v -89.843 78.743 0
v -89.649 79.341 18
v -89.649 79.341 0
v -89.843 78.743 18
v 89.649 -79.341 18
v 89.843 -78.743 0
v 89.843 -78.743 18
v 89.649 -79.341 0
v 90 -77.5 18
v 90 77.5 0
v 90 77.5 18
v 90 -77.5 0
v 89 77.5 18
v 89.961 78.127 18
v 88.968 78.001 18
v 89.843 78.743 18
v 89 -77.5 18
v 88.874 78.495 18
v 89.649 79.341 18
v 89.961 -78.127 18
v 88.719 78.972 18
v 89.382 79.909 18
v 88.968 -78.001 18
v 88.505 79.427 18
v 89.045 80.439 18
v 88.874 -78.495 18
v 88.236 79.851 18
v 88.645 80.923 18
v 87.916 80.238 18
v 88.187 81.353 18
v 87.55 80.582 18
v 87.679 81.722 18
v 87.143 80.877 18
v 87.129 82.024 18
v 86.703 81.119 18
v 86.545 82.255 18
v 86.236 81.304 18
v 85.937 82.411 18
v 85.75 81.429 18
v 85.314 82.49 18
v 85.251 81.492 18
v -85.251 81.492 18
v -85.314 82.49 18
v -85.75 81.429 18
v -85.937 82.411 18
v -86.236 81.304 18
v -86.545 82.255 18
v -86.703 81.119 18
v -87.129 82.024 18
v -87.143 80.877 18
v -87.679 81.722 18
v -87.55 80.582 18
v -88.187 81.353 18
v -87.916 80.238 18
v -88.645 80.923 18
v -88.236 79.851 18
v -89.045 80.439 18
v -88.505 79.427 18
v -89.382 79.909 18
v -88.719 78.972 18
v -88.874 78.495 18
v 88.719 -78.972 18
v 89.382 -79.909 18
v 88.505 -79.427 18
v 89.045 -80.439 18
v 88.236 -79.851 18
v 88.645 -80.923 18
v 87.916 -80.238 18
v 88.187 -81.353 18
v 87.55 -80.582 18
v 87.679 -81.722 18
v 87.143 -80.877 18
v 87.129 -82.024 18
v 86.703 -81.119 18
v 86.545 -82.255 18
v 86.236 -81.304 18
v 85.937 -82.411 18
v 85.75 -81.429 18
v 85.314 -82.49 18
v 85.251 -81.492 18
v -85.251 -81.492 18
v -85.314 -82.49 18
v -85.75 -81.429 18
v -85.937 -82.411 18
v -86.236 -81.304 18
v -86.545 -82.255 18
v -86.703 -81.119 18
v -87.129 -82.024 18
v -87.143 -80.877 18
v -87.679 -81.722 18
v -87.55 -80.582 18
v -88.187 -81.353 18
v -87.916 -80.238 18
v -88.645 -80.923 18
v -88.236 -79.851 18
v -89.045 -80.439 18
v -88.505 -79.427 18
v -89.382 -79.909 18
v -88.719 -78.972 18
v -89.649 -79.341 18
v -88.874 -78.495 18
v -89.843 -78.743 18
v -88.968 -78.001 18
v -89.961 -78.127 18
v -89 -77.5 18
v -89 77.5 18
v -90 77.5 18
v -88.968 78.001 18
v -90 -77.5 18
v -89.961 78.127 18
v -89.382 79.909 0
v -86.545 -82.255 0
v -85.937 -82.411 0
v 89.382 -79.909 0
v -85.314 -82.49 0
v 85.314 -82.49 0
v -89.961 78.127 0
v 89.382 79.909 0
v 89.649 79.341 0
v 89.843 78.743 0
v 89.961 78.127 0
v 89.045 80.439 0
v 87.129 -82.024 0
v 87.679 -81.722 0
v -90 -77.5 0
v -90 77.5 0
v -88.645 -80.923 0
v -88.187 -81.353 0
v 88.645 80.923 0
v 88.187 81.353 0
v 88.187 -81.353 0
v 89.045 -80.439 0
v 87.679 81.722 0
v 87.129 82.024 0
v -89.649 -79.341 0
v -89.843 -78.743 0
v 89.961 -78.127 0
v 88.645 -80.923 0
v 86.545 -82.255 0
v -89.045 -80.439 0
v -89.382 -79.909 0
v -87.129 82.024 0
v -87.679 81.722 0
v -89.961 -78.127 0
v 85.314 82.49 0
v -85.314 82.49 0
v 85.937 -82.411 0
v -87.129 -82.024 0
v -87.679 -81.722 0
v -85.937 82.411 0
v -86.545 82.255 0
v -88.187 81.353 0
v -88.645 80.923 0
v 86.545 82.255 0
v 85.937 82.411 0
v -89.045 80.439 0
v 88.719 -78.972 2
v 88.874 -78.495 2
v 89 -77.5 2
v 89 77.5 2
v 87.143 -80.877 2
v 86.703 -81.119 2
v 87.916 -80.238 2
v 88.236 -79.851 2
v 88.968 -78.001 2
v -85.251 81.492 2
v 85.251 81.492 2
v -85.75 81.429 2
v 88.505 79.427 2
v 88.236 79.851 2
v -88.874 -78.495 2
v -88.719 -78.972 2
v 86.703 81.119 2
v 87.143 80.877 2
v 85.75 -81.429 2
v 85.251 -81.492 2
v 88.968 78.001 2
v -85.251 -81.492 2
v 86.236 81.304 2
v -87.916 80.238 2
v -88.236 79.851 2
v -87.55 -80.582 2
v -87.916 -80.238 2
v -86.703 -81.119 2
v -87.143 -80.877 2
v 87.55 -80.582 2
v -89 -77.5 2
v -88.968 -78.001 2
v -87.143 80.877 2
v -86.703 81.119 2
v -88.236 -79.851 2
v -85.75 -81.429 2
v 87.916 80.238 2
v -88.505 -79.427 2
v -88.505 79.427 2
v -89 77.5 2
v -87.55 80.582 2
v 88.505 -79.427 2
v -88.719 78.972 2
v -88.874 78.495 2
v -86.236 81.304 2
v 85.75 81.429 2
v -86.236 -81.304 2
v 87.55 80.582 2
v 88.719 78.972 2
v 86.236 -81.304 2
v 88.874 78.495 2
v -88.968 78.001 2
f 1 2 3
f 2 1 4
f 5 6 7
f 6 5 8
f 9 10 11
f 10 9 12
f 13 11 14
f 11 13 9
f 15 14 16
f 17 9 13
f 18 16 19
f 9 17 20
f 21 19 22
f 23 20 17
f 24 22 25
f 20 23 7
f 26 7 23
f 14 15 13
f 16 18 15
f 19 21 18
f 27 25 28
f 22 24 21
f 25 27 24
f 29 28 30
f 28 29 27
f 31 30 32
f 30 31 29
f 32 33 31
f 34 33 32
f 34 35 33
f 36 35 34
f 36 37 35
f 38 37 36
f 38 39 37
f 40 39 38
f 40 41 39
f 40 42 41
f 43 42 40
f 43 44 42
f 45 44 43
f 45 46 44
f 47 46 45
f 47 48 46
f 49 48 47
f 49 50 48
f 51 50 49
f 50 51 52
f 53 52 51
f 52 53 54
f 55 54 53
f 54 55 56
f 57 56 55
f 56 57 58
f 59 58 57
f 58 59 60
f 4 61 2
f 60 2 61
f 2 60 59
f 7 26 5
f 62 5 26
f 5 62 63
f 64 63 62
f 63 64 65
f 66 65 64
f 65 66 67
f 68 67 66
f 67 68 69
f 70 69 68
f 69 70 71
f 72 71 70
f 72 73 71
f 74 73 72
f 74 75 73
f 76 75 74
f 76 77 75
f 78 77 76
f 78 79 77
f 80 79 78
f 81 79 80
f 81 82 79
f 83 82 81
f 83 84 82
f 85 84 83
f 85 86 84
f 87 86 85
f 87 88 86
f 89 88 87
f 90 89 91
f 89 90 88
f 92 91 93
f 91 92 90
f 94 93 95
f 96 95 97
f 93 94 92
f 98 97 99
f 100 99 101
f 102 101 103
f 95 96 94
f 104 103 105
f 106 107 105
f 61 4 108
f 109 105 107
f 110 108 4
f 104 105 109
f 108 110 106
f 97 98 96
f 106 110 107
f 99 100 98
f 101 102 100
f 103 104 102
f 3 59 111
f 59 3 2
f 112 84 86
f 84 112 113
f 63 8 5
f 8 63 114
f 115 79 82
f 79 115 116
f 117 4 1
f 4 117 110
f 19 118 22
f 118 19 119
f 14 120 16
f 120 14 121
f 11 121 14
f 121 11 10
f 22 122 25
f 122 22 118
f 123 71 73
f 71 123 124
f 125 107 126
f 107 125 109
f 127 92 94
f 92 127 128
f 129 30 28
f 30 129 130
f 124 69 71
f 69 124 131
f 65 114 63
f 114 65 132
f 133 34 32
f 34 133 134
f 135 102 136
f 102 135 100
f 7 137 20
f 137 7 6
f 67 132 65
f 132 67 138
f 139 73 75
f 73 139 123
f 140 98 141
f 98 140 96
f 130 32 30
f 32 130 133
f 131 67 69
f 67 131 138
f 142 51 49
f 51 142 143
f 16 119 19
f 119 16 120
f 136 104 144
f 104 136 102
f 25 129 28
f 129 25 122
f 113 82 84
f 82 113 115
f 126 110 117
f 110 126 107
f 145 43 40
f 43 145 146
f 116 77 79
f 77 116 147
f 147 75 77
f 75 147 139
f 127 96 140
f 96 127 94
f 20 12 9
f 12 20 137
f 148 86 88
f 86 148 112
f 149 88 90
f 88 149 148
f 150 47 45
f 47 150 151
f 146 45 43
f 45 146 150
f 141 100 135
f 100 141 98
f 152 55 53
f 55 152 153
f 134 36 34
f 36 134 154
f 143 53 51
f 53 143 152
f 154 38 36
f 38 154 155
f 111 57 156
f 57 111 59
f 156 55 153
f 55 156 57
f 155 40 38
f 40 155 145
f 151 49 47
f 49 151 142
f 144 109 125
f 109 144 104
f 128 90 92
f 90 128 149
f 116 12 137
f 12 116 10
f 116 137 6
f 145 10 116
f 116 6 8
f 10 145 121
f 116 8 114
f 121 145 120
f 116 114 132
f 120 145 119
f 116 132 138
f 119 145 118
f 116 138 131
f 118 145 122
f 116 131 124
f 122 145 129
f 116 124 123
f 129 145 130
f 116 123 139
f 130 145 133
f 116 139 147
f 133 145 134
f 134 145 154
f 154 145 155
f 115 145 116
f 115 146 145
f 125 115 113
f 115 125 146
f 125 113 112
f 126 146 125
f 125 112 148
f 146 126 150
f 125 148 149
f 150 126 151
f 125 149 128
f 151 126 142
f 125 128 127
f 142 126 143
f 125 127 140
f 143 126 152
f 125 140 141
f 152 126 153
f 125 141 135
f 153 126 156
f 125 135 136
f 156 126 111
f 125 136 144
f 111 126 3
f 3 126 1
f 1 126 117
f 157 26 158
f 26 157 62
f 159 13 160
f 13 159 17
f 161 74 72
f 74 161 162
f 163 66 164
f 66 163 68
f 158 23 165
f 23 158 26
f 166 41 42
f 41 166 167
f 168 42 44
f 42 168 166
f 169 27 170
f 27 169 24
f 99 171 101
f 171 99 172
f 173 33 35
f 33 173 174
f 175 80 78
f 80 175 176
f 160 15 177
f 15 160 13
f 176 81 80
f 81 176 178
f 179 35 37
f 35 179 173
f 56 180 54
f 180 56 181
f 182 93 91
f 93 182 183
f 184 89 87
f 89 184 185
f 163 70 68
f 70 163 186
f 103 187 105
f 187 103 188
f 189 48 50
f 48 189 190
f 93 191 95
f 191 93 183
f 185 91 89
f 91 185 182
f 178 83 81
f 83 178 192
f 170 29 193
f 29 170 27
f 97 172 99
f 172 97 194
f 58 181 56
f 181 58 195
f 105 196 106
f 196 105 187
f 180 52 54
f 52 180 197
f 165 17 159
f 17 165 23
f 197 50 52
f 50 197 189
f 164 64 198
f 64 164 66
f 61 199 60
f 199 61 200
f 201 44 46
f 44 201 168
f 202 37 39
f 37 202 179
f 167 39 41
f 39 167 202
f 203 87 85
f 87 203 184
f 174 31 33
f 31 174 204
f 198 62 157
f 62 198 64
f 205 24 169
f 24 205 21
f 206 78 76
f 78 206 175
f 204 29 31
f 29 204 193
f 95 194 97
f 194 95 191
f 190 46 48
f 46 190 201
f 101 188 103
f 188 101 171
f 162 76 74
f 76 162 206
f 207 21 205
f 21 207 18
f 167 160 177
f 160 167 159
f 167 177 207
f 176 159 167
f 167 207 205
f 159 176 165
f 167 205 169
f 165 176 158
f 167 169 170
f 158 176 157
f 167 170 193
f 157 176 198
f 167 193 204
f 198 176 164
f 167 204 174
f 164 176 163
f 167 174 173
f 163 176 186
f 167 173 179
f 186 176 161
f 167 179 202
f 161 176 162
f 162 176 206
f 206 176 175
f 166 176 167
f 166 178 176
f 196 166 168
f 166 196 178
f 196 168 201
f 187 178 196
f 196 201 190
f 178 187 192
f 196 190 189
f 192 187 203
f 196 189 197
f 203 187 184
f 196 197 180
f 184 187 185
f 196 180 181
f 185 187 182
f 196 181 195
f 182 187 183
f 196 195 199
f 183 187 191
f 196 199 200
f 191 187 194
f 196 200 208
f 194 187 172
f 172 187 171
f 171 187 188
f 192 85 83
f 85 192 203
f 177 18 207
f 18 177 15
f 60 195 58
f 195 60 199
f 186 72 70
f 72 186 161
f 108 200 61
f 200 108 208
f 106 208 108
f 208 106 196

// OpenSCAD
$fn = 50;


difference() {
	union() {
		hull() {
			translate(v = [-85.0000000000, 77.5000000000, 0]) {
				cylinder(h = 18, r = 5);
			}
			translate(v = [85.0000000000, 77.5000000000, 0]) {
				cylinder(h = 18, r = 5);
			}
			translate(v = [-85.0000000000, -77.5000000000, 0]) {
				cylinder(h = 18, r = 5);
			}
			translate(v = [85.0000000000, -77.5000000000, 0]) {
				cylinder(h = 18, r = 5);
			}
		}
	}
	union() {
		translate(v = [0, 0, 2]) {
			hull() {
				translate(v = [-85.0000000000, 77.5000000000, 0]) {
					cylinder(h = 16, r = 4);
				}
				translate(v = [85.0000000000, 77.5000000000, 0]) {
					cylinder(h = 16, r = 4);
				}
				translate(v = [-85.0000000000, -77.5000000000, 0]) {
					cylinder(h = 16, r = 4);
				}
				translate(v = [85.0000000000, -77.5000000000, 0]) {
					cylinder(h = 16, r = 4);
				}
			}
		}
	}
}
